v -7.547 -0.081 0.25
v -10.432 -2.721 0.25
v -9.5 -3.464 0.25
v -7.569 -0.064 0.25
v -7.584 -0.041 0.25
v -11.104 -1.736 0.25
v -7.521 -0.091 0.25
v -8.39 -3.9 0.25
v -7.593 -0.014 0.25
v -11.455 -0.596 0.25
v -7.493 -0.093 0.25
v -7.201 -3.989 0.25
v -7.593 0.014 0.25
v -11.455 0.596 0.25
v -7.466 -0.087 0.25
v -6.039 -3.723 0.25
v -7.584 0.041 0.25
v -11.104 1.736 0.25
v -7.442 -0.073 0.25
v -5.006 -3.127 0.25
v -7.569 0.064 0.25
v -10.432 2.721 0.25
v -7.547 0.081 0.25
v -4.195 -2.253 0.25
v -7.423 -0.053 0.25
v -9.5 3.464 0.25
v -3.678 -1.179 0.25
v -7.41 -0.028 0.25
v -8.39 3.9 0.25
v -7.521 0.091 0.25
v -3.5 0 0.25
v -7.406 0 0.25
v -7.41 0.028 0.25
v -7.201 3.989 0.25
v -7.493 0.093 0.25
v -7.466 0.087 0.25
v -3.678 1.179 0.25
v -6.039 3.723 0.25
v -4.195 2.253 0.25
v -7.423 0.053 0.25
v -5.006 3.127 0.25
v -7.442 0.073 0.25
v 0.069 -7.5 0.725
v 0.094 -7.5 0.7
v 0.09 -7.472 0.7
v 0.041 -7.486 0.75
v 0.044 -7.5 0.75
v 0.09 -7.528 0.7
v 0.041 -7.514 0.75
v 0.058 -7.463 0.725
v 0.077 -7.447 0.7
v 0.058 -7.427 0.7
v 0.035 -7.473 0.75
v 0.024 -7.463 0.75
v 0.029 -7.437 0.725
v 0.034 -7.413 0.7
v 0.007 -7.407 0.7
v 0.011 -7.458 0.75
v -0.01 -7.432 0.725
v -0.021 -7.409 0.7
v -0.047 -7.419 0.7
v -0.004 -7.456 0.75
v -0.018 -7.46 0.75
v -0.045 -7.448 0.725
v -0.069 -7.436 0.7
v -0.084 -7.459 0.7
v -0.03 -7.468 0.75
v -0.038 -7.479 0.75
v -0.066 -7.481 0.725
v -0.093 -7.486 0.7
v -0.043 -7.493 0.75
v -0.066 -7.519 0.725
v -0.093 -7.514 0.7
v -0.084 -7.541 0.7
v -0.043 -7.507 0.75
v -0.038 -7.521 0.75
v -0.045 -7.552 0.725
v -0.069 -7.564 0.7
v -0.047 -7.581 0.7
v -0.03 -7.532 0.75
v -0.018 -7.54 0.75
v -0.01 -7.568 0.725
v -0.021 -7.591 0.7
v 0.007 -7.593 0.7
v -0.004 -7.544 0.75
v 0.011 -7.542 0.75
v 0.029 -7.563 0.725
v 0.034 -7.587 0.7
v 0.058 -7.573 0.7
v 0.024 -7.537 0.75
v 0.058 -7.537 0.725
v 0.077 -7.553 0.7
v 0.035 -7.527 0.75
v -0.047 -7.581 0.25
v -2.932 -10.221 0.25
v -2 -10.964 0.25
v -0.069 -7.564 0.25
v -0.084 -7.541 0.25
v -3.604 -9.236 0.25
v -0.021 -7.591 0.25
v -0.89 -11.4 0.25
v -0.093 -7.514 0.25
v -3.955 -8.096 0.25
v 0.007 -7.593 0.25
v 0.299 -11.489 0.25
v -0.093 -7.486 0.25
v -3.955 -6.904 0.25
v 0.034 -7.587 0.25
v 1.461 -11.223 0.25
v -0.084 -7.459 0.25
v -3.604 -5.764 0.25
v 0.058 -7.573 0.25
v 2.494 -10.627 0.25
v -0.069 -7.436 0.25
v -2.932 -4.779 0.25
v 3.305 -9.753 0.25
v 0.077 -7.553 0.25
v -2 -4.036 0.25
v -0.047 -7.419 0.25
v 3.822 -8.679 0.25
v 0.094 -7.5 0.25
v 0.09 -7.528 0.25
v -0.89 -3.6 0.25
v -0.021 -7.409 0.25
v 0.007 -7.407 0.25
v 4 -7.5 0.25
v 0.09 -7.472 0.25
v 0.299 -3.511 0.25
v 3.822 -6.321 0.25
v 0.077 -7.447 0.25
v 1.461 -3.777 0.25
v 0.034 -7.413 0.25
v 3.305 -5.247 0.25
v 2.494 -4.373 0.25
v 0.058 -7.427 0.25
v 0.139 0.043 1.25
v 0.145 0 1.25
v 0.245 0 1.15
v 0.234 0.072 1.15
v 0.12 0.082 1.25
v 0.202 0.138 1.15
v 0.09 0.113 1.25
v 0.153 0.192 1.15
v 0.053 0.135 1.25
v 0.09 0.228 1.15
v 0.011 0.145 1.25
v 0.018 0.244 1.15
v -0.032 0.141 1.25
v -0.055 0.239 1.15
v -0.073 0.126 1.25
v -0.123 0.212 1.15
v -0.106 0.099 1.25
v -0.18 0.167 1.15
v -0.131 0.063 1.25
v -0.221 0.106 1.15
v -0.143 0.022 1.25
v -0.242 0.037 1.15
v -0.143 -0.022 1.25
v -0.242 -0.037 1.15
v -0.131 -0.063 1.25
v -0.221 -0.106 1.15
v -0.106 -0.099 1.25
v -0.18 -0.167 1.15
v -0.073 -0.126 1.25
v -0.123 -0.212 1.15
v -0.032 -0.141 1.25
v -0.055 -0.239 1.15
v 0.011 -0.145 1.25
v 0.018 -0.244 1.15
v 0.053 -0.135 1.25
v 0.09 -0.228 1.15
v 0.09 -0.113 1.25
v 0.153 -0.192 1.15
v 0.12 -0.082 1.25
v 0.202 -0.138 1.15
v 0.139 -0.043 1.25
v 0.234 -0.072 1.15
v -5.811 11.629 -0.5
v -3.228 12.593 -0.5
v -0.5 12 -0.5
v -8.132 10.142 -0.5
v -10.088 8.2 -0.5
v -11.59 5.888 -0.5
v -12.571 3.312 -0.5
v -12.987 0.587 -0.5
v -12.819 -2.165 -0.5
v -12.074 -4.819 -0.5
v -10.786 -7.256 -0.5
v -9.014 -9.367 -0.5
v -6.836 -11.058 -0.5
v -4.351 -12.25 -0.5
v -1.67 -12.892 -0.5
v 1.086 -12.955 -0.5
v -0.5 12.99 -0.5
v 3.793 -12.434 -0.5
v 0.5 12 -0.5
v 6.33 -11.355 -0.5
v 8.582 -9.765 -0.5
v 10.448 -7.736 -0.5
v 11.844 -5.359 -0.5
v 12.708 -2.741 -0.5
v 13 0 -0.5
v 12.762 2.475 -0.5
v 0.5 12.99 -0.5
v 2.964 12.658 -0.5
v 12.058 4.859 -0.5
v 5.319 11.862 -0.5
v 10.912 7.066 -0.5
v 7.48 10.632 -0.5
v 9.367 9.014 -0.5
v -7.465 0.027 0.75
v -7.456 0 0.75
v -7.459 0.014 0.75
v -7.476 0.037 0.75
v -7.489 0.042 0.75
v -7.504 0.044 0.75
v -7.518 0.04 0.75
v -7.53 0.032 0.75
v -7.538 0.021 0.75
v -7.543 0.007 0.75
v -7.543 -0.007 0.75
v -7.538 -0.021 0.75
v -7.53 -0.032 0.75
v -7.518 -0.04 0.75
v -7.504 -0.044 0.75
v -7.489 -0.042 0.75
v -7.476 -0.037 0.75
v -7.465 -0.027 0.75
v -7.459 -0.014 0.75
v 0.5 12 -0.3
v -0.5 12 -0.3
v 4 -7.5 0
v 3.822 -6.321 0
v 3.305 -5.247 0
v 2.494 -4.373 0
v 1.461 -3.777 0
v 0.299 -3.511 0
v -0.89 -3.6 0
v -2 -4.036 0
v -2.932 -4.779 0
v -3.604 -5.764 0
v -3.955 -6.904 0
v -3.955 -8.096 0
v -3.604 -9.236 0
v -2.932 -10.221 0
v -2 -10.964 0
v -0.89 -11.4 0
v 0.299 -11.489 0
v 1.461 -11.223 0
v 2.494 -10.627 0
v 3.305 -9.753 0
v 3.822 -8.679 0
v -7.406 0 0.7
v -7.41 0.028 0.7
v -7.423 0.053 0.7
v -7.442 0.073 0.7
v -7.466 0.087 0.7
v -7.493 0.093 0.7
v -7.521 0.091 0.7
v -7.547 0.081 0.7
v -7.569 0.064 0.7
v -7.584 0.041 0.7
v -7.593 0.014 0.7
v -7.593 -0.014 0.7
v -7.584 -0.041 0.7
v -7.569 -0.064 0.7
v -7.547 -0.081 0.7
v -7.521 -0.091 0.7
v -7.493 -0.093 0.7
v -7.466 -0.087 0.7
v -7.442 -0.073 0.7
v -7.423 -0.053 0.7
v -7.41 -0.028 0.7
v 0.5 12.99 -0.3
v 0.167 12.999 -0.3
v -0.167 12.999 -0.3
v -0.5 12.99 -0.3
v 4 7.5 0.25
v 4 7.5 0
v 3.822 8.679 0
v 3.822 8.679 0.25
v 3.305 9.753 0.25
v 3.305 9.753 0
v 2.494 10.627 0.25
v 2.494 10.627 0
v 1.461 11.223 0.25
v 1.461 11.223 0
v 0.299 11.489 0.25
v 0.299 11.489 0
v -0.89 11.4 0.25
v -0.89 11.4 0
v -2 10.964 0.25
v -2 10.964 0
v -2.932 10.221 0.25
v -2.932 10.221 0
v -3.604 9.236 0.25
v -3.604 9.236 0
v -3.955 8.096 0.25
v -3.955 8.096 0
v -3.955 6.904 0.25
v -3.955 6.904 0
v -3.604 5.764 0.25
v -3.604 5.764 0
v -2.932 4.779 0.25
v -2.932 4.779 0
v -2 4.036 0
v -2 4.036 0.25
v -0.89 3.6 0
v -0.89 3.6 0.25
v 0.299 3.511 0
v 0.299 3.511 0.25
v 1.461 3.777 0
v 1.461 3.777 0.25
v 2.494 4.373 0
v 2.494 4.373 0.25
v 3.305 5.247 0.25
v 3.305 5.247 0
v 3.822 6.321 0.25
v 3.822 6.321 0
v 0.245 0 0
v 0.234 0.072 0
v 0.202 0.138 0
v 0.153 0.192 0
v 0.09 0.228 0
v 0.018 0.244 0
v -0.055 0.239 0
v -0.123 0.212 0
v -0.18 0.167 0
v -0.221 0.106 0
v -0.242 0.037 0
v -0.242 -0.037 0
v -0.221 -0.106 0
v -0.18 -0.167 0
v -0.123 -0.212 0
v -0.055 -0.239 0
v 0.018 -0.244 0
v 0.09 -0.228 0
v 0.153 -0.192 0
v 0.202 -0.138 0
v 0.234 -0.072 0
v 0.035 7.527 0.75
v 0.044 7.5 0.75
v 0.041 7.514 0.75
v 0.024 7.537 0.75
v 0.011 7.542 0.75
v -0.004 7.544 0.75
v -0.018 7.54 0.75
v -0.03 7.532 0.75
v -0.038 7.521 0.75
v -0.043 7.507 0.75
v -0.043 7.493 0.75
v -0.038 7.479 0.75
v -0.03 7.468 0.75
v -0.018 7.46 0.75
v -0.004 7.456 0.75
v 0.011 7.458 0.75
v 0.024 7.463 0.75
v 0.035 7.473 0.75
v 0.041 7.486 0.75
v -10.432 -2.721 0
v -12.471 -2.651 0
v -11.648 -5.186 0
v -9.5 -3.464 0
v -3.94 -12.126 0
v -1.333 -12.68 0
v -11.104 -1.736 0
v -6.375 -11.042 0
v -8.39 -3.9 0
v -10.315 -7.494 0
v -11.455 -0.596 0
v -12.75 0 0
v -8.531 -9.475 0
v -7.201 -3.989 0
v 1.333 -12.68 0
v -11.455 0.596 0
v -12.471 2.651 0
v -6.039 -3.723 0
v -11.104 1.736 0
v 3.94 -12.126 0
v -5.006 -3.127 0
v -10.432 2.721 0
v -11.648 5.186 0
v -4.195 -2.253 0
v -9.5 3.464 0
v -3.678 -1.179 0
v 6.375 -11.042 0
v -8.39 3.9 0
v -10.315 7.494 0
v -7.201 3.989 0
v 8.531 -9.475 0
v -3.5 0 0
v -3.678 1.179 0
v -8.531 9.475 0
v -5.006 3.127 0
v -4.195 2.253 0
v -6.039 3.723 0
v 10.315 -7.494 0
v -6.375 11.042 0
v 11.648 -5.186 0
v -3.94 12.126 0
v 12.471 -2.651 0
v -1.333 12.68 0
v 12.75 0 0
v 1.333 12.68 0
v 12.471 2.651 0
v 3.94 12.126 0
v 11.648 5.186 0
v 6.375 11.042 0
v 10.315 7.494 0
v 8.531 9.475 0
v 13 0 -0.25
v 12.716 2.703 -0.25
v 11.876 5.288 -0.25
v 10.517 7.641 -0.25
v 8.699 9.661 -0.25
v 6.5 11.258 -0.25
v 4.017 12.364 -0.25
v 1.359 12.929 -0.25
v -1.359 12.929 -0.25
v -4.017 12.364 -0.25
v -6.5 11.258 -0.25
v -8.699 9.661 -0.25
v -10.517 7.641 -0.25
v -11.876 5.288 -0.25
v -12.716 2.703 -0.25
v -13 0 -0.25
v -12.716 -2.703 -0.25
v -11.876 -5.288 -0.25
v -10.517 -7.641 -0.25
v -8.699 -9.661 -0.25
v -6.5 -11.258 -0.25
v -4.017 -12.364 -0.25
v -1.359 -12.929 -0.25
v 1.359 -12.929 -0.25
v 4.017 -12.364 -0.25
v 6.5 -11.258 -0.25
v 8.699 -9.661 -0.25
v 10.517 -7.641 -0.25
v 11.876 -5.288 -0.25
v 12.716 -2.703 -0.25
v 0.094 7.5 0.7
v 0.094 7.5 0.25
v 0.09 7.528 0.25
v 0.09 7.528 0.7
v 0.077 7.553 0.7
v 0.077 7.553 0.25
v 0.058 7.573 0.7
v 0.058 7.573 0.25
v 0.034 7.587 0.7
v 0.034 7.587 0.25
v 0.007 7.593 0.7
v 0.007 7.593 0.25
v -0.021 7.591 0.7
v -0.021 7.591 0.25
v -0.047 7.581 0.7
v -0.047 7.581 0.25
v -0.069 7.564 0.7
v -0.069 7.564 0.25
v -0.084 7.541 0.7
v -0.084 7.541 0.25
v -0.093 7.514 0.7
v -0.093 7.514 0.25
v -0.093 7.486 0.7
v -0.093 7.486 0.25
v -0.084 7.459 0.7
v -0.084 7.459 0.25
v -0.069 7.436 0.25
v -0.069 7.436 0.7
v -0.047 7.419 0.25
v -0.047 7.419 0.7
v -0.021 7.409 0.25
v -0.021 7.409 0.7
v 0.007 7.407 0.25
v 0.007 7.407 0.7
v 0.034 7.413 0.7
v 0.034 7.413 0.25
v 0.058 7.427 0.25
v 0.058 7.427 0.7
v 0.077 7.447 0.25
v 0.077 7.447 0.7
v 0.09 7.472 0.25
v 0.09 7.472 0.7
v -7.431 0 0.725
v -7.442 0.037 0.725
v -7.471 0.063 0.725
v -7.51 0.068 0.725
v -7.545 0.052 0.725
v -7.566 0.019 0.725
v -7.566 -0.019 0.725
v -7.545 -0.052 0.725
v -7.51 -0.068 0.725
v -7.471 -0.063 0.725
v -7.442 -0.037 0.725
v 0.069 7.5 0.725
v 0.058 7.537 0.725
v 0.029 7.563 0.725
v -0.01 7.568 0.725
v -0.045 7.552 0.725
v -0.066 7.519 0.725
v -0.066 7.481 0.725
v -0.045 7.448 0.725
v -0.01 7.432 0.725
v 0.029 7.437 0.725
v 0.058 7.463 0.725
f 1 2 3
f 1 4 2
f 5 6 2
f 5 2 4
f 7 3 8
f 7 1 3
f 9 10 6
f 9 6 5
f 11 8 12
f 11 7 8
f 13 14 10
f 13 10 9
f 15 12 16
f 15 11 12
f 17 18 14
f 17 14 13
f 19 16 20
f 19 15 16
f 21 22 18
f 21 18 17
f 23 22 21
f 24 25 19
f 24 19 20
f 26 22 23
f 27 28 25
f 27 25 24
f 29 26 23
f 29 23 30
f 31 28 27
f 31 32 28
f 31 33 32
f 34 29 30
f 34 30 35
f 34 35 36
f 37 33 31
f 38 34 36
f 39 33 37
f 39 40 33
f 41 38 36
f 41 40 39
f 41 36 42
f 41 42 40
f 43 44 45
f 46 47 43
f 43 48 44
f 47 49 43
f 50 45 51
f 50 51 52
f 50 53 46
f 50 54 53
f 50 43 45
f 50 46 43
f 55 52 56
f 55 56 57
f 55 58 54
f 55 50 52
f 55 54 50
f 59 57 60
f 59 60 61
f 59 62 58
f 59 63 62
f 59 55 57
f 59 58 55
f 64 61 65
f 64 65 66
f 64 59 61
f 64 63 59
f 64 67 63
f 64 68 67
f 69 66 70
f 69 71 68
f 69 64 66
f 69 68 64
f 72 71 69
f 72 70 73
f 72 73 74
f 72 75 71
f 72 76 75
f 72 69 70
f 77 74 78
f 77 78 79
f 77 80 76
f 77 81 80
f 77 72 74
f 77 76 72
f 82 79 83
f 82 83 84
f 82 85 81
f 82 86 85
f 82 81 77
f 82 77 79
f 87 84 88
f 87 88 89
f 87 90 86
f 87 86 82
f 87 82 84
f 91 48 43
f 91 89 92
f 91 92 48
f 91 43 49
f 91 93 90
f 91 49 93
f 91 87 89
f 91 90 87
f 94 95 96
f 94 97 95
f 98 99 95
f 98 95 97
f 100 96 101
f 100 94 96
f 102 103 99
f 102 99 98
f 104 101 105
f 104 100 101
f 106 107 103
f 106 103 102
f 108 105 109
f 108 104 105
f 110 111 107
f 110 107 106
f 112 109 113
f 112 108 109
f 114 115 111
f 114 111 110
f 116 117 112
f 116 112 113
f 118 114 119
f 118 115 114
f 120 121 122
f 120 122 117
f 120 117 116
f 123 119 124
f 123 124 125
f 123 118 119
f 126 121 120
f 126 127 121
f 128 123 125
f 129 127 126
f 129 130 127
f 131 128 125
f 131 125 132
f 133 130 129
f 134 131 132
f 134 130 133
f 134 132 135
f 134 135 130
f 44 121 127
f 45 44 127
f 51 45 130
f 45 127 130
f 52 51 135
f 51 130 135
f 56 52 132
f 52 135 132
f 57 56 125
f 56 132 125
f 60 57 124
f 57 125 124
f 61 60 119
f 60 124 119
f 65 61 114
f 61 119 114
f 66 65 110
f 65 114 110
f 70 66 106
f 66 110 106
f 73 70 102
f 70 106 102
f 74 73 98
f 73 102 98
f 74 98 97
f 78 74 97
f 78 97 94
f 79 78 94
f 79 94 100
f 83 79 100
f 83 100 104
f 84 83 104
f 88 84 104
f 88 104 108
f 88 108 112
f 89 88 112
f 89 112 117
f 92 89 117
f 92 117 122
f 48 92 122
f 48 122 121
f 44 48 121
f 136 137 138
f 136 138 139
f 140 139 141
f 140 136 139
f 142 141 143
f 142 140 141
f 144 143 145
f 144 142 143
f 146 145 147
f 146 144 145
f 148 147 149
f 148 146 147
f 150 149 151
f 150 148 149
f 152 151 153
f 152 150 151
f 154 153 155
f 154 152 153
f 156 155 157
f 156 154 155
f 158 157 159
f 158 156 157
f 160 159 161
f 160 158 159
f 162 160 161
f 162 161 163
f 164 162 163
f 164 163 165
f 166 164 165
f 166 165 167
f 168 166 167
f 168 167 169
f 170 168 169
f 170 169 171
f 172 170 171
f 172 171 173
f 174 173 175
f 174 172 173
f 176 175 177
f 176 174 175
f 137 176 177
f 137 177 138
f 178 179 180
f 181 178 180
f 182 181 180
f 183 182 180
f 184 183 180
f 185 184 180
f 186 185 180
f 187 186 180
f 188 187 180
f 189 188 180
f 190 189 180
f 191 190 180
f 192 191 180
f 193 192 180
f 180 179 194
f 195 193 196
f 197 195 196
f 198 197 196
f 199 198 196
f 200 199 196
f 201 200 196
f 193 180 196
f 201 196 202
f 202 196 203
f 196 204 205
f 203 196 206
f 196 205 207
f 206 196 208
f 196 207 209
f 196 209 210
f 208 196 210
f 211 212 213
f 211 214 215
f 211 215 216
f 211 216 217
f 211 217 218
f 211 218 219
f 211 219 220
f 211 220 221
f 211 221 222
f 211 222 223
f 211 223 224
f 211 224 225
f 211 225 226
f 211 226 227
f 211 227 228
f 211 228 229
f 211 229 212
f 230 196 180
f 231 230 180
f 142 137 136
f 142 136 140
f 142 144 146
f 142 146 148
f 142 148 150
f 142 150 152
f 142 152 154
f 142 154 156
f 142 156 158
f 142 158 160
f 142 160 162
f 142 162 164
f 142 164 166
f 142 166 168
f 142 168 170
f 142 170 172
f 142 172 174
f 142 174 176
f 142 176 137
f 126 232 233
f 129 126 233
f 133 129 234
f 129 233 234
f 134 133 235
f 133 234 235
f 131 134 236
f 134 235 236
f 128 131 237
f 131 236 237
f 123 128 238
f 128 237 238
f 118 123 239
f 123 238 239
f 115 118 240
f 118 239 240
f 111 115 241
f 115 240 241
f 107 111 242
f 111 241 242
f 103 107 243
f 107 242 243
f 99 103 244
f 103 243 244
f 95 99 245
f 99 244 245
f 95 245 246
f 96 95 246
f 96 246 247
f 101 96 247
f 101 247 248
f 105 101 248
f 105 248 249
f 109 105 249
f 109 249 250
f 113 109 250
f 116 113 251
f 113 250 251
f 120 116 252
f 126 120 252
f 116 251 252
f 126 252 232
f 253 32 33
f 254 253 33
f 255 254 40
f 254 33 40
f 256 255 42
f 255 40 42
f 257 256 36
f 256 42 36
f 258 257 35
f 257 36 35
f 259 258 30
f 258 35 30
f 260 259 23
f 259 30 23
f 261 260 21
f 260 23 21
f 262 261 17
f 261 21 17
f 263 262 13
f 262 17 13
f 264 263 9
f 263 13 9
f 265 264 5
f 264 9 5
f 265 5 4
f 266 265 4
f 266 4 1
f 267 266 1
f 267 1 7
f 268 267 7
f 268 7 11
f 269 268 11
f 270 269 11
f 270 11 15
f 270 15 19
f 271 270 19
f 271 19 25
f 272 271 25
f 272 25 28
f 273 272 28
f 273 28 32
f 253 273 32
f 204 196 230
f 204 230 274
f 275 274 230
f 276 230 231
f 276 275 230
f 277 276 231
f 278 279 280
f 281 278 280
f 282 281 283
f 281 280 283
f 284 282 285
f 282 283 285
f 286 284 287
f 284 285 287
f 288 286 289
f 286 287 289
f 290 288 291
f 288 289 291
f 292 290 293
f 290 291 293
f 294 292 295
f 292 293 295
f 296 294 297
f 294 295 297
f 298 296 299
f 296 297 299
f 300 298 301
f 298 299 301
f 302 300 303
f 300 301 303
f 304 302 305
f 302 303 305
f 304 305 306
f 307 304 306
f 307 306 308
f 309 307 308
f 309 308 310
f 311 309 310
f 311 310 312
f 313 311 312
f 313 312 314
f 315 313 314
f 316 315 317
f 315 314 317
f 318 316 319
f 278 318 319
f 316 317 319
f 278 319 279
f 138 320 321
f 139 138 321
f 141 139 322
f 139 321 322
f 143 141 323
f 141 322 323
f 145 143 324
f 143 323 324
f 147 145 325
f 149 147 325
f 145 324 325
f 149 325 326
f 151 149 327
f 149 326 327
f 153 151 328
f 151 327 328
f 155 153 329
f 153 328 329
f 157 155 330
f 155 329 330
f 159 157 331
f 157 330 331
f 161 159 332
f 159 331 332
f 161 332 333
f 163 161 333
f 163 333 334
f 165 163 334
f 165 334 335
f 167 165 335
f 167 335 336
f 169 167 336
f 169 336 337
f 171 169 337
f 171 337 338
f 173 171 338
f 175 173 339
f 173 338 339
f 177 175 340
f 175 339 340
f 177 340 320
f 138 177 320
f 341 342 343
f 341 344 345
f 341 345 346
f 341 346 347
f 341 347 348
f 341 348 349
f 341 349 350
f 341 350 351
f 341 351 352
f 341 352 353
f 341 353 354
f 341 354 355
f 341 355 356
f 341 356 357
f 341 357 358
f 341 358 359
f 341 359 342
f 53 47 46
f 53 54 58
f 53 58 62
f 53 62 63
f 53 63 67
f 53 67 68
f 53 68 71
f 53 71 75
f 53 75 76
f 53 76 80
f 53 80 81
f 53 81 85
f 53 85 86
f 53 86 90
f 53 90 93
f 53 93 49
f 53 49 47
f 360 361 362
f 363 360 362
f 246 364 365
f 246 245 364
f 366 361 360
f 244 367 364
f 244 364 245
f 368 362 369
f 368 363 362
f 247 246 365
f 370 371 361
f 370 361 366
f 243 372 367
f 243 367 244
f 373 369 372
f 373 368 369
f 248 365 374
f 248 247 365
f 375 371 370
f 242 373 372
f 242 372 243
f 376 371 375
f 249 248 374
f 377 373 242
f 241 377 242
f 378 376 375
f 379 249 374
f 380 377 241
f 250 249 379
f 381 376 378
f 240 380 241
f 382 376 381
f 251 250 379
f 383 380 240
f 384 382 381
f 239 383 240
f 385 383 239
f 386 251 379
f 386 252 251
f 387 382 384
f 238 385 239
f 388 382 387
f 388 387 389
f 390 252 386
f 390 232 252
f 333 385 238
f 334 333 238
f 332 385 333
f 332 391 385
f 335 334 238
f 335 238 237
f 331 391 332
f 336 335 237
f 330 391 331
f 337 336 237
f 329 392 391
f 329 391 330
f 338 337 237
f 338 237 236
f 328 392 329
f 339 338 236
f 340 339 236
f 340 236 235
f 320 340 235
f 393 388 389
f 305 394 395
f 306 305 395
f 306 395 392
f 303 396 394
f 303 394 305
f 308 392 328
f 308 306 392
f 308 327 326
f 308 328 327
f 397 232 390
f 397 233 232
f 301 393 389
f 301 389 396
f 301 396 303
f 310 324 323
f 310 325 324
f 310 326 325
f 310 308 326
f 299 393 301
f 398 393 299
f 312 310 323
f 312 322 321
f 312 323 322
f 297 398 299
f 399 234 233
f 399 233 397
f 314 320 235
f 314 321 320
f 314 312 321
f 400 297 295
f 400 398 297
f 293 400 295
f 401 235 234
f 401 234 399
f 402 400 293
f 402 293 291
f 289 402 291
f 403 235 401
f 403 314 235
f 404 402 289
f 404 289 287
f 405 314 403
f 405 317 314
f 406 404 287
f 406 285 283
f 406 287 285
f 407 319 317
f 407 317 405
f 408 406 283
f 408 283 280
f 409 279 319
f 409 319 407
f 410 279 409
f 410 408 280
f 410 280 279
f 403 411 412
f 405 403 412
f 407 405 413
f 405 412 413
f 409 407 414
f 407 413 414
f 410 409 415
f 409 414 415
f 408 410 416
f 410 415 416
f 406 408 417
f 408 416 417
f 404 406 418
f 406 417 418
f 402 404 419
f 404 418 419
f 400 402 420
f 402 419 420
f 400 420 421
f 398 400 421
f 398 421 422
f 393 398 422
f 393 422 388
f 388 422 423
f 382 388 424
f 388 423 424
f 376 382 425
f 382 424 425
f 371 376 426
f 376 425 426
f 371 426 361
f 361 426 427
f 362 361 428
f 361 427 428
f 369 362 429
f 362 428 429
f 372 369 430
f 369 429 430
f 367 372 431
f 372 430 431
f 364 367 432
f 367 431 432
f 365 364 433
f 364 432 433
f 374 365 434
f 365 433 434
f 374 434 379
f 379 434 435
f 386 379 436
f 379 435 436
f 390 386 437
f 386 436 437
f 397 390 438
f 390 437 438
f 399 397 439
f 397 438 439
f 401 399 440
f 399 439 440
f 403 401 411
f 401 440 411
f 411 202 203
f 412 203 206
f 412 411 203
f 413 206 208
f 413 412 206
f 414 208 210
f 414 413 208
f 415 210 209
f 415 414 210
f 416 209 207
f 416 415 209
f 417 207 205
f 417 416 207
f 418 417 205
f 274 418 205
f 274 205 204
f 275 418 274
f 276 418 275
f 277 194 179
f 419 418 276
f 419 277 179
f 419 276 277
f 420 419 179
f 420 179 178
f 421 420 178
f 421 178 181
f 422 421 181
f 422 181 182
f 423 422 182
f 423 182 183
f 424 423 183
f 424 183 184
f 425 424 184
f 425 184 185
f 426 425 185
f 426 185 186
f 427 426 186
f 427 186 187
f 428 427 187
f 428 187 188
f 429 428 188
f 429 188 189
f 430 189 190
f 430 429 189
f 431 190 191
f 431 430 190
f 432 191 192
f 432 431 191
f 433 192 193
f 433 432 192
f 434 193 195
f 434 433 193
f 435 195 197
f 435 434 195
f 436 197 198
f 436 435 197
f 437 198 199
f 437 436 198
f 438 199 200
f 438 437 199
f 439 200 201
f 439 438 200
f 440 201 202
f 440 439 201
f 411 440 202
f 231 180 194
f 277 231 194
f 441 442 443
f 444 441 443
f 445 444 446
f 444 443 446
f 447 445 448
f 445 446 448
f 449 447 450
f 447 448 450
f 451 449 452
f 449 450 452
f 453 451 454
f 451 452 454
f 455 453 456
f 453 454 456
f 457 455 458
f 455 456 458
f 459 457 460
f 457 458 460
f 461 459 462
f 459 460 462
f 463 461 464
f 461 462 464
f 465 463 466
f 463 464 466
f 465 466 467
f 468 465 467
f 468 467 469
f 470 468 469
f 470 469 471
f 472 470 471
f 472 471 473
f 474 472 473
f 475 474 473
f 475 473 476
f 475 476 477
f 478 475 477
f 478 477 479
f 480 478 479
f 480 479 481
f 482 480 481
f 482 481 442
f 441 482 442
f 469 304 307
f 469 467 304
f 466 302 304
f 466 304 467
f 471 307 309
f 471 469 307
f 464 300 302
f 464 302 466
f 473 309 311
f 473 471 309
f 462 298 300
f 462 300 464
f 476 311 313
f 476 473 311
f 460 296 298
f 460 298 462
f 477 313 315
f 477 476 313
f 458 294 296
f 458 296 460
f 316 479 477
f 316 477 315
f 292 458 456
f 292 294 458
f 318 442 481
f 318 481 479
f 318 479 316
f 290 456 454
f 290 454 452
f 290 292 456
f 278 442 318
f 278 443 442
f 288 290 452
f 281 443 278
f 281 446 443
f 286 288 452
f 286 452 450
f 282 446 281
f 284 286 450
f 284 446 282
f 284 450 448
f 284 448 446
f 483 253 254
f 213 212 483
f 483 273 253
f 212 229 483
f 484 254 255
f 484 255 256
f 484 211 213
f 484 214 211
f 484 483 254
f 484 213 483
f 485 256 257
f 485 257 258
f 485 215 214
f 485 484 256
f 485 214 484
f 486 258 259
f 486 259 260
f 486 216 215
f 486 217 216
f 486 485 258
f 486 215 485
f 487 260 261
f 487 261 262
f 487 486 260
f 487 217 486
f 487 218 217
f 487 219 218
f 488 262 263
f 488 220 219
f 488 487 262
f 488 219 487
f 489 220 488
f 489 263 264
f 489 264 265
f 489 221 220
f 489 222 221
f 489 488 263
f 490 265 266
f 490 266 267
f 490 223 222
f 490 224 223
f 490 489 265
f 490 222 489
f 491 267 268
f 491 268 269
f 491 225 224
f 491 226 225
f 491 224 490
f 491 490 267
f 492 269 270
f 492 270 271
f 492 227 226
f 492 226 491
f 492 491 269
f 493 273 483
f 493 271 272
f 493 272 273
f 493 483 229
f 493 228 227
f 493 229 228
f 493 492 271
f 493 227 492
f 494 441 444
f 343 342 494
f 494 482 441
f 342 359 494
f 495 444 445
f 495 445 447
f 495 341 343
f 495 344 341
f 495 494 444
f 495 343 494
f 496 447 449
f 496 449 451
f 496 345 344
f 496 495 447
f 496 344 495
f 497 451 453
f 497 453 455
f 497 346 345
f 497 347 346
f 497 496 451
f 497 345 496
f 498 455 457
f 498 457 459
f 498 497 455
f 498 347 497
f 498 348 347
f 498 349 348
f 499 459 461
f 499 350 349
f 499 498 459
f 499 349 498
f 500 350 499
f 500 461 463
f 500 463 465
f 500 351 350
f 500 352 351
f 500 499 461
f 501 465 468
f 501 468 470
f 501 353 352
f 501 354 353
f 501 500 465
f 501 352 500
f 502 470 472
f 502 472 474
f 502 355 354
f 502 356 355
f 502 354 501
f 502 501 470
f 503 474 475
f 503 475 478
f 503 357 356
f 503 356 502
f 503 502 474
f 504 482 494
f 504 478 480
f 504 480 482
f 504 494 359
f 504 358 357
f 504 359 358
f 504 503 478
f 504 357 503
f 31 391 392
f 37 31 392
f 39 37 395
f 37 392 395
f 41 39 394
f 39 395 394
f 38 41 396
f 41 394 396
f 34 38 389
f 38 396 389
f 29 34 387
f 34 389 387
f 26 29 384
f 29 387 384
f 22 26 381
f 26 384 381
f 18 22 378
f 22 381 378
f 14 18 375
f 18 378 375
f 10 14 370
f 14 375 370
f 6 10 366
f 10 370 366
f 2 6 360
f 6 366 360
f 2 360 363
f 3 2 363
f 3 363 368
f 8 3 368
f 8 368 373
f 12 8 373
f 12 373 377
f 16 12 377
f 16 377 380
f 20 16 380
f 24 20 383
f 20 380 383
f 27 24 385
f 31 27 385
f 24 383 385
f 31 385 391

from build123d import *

# Parameters (mm, degrees)
SKETCH1_R           = 13
BASE_EXTRUDE_DEPTH  = 0.5
SKETCH2_R           = 4
BOSS_EXTRUDE1_DEPTH = 0.25
SKETCH3_R           = 0.09375
BOSS_EXTRUDE2_DEPTH = 0.75
SKETCH4_R           = 0.245
BOSS_EXTRUDE3_DEPTH = 1.25
SKETCH5_W           = 1
SKETCH5_H           = 2
CUT_EXTRUDE1_DEPTH  = 0.2
CHAMFER1_SIZE       = 0.1
CHAMFER2_SIZE       = 0.05
CHAMFER4_SIZE       = 0.25


with BuildPart() as part:
    # Sketch1 → Base-Extrude (new body)
    with BuildSketch(Plane.XY):
        Circle(SKETCH1_R)
    extrude(amount=-BASE_EXTRUDE_DEPTH)

    # Sketch2 → Boss-Extrude1 (add)
    with BuildSketch(Plane.XY):
        with Locations((-7.5, 0)):
            Circle(SKETCH2_R)
        with Locations((0, 7.5)):
            Circle(SKETCH2_R)
        with Locations((0, -7.5)):
            Circle(SKETCH2_R)
    extrude(amount=BOSS_EXTRUDE1_DEPTH)

    # Sketch3 → Boss-Extrude2 (add)
    with BuildSketch(Plane.XY):
        with Locations((-7.5, 0)):
            Circle(SKETCH3_R)
        with Locations((0, 7.5)):
            Circle(SKETCH3_R)
        with Locations((0, -7.5)):
            Circle(SKETCH3_R)
    extrude(amount=BOSS_EXTRUDE2_DEPTH)

    # Sketch4 → Boss-Extrude3 (add)
    with BuildSketch(Plane.XY):
        Circle(SKETCH4_R)
    extrude(amount=BOSS_EXTRUDE3_DEPTH)

    # Sketch5 → Cut-Extrude1 (cut)
    with BuildSketch(Plane(origin=(0, 0, -0.5), x_dir=(-1, 0, 0), z_dir=(0, 0, -1))):
        with Locations((0, 13)):
            Rectangle(SKETCH5_W, SKETCH5_H)
    extrude(amount=-CUT_EXTRUDE1_DEPTH, mode=Mode.SUBTRACT)

    # Chamfer1
    chamfer1_edges = [part.edges().sort_by_distance(p)[0] for p in [
        (-0.245, 0, 1.25),
    ]]
    chamfer(chamfer1_edges, length=CHAMFER1_SIZE)

    # Chamfer2
    chamfer2_edges = [part.edges().sort_by_distance(p)[0] for p in [
        (-7.59375, 0, 0.75),
        (-0.09375, 7.5, 0.75),
        (-0.09375, -7.5, 0.75),
    ]]
    chamfer(chamfer2_edges, length=CHAMFER2_SIZE)

    # Chamfer4
    chamfer4_edges = [part.edges().sort_by_distance(p)[0] for p in [
        (-13, 0, 0),
    ]]
    chamfer(chamfer4_edges, length=CHAMFER4_SIZE)


solid = part.part
